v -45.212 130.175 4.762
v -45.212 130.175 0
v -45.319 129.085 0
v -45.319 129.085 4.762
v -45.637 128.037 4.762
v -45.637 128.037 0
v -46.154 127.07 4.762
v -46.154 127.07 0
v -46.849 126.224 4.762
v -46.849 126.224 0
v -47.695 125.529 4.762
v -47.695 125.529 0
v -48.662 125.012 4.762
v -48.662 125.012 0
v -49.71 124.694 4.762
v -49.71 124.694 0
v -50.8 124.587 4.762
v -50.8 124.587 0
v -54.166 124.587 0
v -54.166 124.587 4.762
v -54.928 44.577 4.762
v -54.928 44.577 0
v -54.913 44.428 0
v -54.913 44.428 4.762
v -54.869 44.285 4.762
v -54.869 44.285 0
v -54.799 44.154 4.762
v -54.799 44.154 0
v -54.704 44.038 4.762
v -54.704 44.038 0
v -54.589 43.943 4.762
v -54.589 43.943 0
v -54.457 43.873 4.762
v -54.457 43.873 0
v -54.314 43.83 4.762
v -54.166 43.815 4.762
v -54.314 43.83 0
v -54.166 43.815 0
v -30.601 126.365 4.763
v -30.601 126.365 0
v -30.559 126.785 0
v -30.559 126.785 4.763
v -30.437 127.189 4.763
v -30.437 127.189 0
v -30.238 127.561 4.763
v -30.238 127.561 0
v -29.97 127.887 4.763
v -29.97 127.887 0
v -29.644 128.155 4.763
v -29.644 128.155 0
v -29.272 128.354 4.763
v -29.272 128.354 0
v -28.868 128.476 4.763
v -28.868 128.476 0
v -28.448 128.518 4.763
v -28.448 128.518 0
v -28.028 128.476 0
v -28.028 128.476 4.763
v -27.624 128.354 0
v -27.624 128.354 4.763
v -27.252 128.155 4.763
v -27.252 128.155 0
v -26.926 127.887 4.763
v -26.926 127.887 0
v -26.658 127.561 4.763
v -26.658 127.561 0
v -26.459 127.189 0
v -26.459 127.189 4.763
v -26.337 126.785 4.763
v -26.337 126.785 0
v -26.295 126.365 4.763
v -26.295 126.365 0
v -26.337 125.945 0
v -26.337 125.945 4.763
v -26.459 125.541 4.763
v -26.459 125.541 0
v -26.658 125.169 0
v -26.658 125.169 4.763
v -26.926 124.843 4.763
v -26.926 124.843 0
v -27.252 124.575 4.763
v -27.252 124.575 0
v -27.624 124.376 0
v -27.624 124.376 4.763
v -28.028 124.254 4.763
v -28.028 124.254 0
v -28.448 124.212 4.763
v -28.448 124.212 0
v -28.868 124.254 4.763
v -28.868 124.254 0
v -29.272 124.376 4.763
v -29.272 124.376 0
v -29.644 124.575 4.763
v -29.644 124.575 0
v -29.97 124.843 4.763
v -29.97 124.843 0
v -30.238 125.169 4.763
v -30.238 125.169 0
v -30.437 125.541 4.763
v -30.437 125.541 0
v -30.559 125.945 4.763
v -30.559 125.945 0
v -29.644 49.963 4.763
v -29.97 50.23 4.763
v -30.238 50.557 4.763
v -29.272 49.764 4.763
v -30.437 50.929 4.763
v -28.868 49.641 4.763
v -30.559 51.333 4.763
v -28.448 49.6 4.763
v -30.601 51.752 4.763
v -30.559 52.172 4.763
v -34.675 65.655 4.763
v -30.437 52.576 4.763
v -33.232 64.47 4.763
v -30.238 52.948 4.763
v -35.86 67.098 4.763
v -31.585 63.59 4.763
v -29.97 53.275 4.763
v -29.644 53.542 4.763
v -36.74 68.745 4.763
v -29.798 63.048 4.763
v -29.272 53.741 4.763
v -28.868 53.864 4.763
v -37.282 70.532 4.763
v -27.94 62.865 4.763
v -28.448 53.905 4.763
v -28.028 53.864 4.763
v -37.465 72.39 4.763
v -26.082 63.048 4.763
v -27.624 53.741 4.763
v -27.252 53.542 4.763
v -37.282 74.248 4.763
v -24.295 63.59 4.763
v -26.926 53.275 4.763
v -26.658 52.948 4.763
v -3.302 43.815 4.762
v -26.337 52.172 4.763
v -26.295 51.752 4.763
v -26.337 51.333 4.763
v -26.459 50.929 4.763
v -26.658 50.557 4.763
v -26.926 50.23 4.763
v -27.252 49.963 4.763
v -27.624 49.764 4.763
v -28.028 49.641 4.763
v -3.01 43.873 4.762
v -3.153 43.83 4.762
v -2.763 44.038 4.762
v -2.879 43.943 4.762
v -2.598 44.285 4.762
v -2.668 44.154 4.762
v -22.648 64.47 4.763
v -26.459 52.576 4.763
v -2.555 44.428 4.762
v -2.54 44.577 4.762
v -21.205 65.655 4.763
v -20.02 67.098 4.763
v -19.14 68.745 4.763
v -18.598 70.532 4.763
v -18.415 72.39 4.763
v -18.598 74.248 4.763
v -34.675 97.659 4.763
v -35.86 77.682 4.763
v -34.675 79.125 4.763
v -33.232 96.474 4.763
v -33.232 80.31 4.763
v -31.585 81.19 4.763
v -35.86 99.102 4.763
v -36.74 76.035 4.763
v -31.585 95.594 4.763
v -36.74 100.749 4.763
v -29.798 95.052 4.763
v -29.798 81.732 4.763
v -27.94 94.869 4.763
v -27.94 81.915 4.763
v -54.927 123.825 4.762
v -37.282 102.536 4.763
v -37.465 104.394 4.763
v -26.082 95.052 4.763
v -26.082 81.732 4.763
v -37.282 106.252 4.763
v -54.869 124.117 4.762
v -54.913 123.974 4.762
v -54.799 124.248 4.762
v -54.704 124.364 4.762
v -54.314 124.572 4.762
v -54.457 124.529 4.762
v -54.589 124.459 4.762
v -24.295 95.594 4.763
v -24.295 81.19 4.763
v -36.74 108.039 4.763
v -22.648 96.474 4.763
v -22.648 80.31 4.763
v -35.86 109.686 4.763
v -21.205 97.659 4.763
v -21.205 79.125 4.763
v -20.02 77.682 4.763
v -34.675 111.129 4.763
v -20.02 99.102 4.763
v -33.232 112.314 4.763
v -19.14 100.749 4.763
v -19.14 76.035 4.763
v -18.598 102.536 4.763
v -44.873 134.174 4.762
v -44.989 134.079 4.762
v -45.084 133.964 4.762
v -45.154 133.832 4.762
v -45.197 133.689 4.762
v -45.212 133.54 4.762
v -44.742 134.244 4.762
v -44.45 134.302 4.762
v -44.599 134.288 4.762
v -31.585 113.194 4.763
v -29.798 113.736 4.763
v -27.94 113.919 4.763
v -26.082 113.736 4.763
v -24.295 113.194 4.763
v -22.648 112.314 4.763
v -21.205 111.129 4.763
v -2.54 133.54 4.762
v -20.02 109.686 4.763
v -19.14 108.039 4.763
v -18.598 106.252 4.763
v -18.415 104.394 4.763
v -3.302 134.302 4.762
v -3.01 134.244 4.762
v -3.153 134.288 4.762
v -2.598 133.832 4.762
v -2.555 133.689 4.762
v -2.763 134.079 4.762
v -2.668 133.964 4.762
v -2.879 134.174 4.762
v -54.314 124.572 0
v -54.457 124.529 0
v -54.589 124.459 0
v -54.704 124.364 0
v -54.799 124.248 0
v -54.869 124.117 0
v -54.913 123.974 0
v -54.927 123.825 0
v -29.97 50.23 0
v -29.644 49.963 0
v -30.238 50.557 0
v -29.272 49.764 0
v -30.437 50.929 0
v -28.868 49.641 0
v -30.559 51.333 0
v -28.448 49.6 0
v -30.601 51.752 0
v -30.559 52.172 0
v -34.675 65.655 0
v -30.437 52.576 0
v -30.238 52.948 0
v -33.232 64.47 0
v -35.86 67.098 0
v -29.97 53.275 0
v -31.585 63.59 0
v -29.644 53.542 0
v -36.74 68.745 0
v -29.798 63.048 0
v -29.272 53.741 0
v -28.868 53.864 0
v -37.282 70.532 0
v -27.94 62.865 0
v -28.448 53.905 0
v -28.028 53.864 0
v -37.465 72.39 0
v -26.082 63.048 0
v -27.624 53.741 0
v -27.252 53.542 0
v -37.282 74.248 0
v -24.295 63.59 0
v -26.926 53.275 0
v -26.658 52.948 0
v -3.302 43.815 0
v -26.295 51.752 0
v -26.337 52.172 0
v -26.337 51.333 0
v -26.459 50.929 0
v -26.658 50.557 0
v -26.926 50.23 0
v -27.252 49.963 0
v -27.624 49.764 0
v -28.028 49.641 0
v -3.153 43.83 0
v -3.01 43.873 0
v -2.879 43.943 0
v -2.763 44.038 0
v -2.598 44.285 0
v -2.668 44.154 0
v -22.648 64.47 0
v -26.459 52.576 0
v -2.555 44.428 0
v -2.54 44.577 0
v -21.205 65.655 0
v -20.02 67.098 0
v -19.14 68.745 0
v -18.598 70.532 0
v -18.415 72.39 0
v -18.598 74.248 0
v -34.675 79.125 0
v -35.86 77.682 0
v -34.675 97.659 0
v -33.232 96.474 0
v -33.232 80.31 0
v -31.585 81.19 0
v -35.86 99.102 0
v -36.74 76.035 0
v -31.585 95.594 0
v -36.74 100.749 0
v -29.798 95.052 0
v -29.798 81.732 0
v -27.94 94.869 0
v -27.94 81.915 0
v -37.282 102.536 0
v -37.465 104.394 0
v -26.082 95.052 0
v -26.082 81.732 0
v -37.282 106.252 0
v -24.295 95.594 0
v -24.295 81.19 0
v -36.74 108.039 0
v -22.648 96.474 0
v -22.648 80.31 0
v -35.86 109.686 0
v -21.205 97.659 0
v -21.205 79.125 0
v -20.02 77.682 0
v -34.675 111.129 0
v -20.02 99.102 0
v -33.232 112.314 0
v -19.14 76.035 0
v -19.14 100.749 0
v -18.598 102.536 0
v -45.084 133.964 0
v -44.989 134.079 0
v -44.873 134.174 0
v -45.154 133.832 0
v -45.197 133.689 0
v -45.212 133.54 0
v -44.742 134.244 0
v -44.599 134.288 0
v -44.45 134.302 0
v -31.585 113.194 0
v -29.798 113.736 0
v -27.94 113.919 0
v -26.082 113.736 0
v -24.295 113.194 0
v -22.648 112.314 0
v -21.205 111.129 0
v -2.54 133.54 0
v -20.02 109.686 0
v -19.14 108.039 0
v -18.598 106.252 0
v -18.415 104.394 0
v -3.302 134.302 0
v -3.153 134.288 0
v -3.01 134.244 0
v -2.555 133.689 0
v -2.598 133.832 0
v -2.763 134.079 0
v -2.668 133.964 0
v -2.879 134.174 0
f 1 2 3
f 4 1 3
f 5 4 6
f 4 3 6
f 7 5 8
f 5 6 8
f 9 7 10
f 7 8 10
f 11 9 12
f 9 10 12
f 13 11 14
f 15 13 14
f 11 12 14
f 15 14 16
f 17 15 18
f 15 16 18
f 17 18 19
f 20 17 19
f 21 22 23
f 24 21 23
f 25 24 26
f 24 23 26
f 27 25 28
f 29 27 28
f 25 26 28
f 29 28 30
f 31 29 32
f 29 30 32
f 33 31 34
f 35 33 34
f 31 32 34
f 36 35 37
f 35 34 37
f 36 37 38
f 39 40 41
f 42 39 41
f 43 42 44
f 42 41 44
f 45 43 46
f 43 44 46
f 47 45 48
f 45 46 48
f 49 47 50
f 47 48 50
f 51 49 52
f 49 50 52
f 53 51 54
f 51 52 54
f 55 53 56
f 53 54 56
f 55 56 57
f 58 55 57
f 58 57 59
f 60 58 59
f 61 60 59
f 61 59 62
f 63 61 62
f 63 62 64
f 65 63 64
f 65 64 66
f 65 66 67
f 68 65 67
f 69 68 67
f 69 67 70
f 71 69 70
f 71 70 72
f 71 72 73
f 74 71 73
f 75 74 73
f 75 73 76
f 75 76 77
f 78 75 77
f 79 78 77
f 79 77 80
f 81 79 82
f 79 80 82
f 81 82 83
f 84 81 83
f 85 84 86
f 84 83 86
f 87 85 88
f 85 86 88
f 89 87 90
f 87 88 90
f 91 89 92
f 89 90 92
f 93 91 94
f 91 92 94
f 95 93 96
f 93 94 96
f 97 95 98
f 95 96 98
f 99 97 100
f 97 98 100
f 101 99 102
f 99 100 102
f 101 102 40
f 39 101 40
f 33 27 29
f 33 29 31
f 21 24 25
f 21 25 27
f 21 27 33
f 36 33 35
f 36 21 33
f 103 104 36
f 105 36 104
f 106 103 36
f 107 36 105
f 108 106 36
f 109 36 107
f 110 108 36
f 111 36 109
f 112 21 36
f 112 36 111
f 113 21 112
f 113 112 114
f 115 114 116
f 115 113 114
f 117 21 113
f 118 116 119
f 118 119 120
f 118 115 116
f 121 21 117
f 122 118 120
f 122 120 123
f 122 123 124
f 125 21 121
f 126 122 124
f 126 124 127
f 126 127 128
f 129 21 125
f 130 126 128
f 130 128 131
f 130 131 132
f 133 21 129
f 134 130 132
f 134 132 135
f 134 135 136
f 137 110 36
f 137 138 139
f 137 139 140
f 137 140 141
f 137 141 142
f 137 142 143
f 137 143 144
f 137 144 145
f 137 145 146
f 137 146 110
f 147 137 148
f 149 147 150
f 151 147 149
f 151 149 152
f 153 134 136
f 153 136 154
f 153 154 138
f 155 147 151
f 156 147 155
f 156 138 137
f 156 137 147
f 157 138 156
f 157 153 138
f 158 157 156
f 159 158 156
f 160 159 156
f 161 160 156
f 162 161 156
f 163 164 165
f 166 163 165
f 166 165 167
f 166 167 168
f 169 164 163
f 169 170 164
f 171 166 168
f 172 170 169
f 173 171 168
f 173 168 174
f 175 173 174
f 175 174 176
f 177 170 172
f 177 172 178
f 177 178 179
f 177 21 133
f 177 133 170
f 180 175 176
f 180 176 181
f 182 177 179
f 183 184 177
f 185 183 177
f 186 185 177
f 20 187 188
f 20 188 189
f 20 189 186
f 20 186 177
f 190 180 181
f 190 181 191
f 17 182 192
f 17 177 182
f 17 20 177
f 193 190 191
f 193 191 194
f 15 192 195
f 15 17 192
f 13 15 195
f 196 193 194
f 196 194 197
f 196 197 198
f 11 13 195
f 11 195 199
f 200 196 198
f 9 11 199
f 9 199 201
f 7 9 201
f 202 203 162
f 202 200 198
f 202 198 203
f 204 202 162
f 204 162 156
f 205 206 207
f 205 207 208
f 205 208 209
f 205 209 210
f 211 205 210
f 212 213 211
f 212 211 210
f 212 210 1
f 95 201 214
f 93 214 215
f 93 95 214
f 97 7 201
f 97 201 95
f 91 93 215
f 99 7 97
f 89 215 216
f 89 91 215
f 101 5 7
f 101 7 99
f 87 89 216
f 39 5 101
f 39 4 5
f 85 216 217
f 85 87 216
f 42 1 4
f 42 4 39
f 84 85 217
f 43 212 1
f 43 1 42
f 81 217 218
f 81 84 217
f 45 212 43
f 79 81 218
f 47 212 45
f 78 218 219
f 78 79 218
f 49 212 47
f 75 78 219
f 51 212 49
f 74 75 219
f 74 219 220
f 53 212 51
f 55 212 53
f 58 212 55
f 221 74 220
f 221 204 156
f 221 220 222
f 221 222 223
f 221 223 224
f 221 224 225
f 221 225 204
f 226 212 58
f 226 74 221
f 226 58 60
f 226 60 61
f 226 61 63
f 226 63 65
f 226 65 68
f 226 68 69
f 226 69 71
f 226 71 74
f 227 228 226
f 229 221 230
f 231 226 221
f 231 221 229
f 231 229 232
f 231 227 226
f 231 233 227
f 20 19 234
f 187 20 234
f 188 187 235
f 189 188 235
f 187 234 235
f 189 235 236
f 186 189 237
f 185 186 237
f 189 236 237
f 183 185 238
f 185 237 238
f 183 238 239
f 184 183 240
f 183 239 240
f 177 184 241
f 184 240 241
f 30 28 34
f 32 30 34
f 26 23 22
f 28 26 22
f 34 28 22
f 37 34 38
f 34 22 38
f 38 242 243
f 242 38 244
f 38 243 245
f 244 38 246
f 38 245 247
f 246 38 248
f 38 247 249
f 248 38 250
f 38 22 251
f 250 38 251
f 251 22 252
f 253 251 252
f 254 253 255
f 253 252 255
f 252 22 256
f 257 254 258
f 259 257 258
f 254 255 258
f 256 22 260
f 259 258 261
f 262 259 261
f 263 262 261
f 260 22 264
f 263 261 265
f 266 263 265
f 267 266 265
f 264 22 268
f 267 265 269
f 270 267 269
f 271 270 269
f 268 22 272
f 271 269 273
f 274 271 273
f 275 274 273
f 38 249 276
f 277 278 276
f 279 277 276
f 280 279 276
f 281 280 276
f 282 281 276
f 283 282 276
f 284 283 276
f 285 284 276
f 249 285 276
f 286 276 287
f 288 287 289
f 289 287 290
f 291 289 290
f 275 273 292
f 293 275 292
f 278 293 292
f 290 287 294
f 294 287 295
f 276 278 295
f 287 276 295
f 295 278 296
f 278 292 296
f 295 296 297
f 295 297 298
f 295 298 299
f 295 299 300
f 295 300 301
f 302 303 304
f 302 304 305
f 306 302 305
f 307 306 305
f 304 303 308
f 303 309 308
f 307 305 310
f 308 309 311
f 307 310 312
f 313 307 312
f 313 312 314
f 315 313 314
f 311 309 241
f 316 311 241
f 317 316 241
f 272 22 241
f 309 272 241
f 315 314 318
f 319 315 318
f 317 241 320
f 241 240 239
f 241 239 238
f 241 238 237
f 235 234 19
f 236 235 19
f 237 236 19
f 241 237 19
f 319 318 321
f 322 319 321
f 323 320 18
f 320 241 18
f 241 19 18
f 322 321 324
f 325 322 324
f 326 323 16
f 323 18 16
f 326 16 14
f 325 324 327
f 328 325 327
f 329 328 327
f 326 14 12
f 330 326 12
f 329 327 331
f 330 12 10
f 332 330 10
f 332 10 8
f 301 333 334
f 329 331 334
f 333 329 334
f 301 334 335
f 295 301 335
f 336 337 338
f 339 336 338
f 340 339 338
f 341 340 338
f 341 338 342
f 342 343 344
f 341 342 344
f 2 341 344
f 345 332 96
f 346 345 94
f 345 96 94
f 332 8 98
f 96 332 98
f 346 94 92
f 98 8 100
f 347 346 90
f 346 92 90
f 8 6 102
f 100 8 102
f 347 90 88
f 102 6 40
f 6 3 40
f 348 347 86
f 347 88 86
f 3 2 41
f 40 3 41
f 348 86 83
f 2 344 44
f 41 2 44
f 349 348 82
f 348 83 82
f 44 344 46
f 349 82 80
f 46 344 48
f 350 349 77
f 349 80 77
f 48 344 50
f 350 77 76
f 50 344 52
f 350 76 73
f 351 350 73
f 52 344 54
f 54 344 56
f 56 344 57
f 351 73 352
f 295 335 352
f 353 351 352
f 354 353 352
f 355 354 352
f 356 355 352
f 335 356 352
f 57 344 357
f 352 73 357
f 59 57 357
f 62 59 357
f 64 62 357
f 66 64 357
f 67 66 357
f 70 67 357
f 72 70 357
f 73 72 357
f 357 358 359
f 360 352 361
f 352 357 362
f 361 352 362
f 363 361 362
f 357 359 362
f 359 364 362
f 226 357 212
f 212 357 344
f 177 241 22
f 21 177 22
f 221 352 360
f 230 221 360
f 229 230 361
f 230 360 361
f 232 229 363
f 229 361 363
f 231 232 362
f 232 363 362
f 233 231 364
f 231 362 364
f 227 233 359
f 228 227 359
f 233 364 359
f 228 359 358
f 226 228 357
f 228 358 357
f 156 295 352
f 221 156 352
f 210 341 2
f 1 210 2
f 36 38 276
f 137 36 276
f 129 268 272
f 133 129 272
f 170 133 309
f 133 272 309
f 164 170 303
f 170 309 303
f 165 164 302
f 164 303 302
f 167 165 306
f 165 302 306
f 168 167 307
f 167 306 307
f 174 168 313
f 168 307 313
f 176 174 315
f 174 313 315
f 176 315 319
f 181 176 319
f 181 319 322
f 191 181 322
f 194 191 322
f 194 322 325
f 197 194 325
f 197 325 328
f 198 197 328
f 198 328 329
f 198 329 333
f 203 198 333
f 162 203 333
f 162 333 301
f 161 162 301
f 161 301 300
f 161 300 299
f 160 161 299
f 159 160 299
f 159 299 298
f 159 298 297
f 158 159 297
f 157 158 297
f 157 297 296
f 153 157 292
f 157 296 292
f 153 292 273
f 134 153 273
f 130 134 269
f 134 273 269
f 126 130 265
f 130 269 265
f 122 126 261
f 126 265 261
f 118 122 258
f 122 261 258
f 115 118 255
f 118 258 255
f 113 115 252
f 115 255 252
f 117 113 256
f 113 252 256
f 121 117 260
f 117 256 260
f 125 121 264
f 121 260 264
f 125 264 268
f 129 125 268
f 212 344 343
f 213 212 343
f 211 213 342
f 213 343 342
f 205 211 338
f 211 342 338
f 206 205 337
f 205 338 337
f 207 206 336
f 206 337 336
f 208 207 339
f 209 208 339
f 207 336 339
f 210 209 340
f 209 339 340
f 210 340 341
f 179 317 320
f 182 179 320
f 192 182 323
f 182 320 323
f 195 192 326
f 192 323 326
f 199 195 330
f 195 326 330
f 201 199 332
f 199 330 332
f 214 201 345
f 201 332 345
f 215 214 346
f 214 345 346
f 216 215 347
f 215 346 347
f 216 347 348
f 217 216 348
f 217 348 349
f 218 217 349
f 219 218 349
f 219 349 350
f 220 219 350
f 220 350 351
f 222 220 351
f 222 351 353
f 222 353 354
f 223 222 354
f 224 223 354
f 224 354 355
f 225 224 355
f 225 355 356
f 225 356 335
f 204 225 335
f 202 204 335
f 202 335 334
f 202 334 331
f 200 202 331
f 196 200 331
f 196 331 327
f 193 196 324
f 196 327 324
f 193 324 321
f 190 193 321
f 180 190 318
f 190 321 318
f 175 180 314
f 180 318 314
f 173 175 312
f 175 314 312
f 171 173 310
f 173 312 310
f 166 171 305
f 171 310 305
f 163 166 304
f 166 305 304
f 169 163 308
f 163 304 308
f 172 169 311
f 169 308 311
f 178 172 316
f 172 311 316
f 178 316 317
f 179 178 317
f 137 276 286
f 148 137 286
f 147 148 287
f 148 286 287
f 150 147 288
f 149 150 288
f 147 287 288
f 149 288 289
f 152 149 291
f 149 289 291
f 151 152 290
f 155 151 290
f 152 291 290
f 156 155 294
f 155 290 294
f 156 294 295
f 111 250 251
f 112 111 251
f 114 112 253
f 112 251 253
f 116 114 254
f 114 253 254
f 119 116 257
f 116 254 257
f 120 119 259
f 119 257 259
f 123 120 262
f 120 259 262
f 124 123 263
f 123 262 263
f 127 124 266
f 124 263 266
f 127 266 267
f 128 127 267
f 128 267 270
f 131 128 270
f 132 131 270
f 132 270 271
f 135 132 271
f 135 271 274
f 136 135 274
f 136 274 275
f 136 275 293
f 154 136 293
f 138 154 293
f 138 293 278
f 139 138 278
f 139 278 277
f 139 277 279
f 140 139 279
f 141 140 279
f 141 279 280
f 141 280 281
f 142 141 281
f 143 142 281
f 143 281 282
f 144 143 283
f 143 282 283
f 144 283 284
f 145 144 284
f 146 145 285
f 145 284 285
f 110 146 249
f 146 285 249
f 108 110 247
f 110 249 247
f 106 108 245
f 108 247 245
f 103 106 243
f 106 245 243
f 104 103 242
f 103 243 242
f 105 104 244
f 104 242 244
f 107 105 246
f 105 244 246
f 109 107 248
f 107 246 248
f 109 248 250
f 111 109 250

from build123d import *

# Parameters (mm, degrees)
BOSS_EXTRUDE1_DEPTH         = 4.7625
F_6_CLEARANCE_HOLE1_D       = 4.3053
F_3_4_0_75_DIAMETER_HOLE1_D = 19.05


with BuildPart() as part:
    # Sketch1 → Boss-Extrude1 (new body)
    with BuildSketch(Plane.XY):
        with BuildLine():
            Line((-50.8, 124.587), (-54.1655, 124.587))
            ThreePointArc((-54.1655, 124.587), (-54.704315367, 124.363815367), (-54.9275, 123.825))
            Line((-54.9275, 123.825), (-54.9275, 44.577))
            ThreePointArc((-54.9275, 44.577), (-54.704315367, 44.038184633), (-54.1655, 43.815))
            Line((-54.1655, 43.815), (-3.302, 43.815))
            ThreePointArc((-3.302, 43.815), (-2.763184633, 44.038184633), (-2.54, 44.577))
            Line((-2.54, 44.577), (-2.54, 133.5405))
            ThreePointArc((-2.54, 133.5405), (-2.763184633, 134.079315367), (-3.302, 134.3025))
            Line((-3.302, 134.3025), (-44.45, 134.3025))
            ThreePointArc((-44.45, 134.3025), (-44.988815367, 134.079315367), (-45.212, 133.5405))
            Line((-45.212, 133.5405), (-45.212, 130.175))
            ThreePointArc((-45.212, 130.175), (-46.848687307, 126.223687307), (-50.8, 124.587))
        make_face()
    extrude(amount=BOSS_EXTRUDE1_DEPTH)

    # #6 Clearance Hole1 (through all)
    with Locations(Plane.XY.offset(4.7625)):
        with Locations((-28.448, 126.365), (-28.448, 51.7525)):
            Hole(F_6_CLEARANCE_HOLE1_D / 2)

    # 3/4 (0.75) Diameter Hole1 (through all)
    with Locations(Plane.XY.offset(4.7625)):
        with Locations((-27.94, 72.39), (-27.94, 104.394)):
            Hole(F_3_4_0_75_DIAMETER_HOLE1_D / 2)


solid = part.part
